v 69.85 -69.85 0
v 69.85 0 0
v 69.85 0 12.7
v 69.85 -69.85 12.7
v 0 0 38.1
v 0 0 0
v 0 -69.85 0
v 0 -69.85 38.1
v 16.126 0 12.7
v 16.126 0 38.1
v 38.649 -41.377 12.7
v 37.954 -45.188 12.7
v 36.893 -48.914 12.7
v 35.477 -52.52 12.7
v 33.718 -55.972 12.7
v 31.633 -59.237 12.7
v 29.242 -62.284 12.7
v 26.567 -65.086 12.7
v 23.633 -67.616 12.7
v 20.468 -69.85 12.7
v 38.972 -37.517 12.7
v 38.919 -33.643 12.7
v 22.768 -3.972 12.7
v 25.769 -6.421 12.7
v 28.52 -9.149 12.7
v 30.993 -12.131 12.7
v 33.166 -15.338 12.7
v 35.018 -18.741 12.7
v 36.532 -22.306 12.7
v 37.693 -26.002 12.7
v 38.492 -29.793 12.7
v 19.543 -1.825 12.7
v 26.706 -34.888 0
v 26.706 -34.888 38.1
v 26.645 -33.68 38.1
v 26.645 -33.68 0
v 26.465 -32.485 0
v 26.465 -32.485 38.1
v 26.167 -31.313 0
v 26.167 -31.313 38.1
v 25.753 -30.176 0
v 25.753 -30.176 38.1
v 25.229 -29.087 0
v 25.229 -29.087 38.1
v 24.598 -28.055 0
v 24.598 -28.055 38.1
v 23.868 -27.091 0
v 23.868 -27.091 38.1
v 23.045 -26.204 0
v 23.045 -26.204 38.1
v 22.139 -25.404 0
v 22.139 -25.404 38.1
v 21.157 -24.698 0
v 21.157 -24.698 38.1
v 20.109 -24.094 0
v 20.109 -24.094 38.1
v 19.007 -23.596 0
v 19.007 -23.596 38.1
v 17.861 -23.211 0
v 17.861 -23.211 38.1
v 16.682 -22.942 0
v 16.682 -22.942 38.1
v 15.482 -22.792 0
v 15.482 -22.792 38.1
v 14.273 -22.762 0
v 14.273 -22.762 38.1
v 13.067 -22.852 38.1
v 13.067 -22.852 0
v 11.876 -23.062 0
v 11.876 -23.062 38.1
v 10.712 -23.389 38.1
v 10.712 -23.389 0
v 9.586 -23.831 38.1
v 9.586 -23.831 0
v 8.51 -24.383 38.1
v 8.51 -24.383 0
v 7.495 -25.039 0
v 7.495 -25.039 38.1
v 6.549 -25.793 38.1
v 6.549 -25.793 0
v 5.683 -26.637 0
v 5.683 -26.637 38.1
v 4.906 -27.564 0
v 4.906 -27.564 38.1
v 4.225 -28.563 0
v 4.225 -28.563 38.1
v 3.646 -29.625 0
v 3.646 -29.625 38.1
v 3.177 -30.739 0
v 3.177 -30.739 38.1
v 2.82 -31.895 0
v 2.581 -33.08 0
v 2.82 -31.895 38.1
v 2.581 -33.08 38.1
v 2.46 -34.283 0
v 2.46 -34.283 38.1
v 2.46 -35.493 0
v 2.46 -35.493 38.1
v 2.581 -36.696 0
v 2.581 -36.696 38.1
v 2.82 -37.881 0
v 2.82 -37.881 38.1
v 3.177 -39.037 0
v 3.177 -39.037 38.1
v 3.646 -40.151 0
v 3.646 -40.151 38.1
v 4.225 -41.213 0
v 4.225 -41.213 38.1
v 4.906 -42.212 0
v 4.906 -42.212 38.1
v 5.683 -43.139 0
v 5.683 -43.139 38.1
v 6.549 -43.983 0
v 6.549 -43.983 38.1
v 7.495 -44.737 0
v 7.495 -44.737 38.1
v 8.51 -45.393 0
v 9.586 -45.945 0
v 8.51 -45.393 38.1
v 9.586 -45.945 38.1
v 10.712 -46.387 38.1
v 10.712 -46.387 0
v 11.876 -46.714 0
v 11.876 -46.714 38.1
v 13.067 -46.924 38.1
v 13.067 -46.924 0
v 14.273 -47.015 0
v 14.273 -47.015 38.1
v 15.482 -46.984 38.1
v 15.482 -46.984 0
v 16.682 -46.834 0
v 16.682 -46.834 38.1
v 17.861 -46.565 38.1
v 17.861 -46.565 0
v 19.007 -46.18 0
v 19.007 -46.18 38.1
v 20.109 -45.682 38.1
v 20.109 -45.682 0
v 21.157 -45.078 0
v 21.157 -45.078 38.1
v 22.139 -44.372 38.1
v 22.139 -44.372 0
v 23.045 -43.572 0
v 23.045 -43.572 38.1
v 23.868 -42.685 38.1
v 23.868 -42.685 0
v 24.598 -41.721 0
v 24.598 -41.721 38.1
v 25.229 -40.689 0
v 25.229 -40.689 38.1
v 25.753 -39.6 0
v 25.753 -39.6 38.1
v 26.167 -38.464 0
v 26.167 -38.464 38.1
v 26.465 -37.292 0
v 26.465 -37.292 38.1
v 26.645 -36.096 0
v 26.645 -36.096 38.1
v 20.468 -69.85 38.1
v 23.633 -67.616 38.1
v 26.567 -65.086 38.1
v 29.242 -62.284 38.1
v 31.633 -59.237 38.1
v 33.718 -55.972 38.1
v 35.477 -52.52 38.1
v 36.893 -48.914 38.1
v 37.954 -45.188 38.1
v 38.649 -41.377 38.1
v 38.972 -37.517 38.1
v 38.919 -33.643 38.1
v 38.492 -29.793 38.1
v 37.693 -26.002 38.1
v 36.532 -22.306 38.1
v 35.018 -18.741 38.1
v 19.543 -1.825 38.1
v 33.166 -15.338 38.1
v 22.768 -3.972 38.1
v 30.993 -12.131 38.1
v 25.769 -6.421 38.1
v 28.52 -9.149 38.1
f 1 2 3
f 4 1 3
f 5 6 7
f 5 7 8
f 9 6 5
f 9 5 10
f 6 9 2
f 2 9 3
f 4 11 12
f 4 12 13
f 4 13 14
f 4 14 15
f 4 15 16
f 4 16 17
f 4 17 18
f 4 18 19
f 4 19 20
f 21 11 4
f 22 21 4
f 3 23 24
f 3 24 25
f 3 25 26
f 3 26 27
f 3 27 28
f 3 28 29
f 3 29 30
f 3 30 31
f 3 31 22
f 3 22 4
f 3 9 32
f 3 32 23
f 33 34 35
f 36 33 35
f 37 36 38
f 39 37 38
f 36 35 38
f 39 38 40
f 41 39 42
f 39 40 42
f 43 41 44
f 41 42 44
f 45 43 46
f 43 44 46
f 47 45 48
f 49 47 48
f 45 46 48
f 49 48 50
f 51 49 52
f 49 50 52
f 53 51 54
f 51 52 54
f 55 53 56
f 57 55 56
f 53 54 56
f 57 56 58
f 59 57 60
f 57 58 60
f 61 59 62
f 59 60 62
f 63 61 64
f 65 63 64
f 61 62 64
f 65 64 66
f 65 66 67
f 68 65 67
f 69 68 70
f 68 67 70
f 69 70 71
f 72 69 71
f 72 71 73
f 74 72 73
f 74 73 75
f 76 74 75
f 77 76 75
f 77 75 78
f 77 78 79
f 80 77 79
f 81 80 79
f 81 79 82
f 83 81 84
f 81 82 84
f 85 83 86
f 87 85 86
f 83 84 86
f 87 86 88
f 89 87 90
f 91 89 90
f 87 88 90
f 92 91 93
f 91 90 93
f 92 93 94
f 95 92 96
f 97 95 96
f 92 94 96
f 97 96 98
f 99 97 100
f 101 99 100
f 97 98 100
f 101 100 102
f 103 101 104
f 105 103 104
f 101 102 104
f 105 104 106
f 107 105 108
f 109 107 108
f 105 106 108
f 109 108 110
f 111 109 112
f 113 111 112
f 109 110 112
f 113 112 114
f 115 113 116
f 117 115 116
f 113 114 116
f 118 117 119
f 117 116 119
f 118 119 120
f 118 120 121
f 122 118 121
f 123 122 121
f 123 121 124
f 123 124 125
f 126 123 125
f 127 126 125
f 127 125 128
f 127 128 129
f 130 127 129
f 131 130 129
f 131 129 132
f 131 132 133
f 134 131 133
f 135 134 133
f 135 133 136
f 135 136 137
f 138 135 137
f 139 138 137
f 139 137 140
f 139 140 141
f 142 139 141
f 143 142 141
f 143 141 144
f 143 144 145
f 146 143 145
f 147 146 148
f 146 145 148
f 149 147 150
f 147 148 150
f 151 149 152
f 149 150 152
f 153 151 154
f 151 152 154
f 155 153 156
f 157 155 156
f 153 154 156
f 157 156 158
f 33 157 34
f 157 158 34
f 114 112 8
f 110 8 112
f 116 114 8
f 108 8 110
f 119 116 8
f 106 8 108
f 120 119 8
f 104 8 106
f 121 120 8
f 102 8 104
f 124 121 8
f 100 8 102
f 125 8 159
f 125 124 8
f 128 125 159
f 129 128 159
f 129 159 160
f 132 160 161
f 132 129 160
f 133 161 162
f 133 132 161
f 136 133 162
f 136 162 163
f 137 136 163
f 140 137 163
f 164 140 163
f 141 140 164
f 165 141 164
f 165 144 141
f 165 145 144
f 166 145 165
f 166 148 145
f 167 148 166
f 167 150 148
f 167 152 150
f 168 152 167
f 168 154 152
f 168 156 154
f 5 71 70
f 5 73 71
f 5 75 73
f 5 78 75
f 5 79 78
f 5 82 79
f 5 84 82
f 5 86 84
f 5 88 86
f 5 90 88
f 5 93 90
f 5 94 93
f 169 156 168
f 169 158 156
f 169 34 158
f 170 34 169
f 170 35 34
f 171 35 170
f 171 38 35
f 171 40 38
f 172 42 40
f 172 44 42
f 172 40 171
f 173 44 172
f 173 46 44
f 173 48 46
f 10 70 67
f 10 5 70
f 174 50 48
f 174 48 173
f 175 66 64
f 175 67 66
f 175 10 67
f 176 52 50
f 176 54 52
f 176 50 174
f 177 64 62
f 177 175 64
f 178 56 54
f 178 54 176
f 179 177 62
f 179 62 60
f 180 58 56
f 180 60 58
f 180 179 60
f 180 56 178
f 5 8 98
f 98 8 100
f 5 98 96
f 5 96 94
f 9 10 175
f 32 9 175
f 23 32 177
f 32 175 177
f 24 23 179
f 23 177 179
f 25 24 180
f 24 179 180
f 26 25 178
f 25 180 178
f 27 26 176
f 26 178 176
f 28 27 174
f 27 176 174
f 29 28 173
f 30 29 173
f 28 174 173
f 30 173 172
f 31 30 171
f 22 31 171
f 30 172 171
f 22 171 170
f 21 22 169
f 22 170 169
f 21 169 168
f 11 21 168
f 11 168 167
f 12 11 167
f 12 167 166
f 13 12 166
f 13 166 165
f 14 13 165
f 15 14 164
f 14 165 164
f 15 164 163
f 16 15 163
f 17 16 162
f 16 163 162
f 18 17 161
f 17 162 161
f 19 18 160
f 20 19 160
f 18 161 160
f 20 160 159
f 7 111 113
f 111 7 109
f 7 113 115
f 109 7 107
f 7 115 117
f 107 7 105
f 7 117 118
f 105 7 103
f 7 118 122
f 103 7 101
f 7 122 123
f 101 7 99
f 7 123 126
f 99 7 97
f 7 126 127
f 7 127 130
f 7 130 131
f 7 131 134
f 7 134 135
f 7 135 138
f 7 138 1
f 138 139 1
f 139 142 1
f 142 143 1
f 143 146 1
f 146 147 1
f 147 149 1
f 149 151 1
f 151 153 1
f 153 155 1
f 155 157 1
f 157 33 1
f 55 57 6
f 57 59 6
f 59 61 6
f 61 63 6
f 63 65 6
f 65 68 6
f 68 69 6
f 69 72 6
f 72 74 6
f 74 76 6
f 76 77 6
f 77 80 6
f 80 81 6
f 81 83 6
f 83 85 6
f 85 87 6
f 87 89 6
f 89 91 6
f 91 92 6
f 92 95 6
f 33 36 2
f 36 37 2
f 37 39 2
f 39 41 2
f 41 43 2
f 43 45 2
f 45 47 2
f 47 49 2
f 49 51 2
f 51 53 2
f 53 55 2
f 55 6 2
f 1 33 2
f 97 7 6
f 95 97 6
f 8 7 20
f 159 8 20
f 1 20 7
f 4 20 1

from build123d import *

# Parameters (mm, degrees)
F0_W     = 69.85
F0_H     = 38.1
F1_DEPTH = 69.85
F3_DEPTH = 25.4
F4_R     = 12.130263
F5_DEPTH = 38.1


with BuildPart() as f1:
    # F0 (on Front) → F1 (new body)
    with BuildSketch(Plane.XZ):
        with Locations((34.925, 19.05)):
            Rectangle(F0_W, F0_H)
    extrude(amount=F1_DEPTH)

    # F2 (on face) → F3 (cut)
    with BuildSketch(Plane.XY.offset(38.1)):
        with BuildLine():
            ThreePointArc((16.126048, 0), (38.919005, -33.643201), (20.467674, -69.85))
            Line((20.467674, -69.85), (69.85, -69.85))
            Line((69.85, -69.85), (69.85, 0))
            Line((69.85, 0), (16.126048, 0))
        make_face()
    extrude(amount=-F3_DEPTH, mode=Mode.SUBTRACT)

    # F4 (on face) → F5 (cut)
    with BuildSketch(Plane.XY.offset(38.1)):
        with Locations((14.575467, -34.888081)):
            Circle(F4_R)
    extrude(amount=-F5_DEPTH, mode=Mode.SUBTRACT)


solid = f1.part
